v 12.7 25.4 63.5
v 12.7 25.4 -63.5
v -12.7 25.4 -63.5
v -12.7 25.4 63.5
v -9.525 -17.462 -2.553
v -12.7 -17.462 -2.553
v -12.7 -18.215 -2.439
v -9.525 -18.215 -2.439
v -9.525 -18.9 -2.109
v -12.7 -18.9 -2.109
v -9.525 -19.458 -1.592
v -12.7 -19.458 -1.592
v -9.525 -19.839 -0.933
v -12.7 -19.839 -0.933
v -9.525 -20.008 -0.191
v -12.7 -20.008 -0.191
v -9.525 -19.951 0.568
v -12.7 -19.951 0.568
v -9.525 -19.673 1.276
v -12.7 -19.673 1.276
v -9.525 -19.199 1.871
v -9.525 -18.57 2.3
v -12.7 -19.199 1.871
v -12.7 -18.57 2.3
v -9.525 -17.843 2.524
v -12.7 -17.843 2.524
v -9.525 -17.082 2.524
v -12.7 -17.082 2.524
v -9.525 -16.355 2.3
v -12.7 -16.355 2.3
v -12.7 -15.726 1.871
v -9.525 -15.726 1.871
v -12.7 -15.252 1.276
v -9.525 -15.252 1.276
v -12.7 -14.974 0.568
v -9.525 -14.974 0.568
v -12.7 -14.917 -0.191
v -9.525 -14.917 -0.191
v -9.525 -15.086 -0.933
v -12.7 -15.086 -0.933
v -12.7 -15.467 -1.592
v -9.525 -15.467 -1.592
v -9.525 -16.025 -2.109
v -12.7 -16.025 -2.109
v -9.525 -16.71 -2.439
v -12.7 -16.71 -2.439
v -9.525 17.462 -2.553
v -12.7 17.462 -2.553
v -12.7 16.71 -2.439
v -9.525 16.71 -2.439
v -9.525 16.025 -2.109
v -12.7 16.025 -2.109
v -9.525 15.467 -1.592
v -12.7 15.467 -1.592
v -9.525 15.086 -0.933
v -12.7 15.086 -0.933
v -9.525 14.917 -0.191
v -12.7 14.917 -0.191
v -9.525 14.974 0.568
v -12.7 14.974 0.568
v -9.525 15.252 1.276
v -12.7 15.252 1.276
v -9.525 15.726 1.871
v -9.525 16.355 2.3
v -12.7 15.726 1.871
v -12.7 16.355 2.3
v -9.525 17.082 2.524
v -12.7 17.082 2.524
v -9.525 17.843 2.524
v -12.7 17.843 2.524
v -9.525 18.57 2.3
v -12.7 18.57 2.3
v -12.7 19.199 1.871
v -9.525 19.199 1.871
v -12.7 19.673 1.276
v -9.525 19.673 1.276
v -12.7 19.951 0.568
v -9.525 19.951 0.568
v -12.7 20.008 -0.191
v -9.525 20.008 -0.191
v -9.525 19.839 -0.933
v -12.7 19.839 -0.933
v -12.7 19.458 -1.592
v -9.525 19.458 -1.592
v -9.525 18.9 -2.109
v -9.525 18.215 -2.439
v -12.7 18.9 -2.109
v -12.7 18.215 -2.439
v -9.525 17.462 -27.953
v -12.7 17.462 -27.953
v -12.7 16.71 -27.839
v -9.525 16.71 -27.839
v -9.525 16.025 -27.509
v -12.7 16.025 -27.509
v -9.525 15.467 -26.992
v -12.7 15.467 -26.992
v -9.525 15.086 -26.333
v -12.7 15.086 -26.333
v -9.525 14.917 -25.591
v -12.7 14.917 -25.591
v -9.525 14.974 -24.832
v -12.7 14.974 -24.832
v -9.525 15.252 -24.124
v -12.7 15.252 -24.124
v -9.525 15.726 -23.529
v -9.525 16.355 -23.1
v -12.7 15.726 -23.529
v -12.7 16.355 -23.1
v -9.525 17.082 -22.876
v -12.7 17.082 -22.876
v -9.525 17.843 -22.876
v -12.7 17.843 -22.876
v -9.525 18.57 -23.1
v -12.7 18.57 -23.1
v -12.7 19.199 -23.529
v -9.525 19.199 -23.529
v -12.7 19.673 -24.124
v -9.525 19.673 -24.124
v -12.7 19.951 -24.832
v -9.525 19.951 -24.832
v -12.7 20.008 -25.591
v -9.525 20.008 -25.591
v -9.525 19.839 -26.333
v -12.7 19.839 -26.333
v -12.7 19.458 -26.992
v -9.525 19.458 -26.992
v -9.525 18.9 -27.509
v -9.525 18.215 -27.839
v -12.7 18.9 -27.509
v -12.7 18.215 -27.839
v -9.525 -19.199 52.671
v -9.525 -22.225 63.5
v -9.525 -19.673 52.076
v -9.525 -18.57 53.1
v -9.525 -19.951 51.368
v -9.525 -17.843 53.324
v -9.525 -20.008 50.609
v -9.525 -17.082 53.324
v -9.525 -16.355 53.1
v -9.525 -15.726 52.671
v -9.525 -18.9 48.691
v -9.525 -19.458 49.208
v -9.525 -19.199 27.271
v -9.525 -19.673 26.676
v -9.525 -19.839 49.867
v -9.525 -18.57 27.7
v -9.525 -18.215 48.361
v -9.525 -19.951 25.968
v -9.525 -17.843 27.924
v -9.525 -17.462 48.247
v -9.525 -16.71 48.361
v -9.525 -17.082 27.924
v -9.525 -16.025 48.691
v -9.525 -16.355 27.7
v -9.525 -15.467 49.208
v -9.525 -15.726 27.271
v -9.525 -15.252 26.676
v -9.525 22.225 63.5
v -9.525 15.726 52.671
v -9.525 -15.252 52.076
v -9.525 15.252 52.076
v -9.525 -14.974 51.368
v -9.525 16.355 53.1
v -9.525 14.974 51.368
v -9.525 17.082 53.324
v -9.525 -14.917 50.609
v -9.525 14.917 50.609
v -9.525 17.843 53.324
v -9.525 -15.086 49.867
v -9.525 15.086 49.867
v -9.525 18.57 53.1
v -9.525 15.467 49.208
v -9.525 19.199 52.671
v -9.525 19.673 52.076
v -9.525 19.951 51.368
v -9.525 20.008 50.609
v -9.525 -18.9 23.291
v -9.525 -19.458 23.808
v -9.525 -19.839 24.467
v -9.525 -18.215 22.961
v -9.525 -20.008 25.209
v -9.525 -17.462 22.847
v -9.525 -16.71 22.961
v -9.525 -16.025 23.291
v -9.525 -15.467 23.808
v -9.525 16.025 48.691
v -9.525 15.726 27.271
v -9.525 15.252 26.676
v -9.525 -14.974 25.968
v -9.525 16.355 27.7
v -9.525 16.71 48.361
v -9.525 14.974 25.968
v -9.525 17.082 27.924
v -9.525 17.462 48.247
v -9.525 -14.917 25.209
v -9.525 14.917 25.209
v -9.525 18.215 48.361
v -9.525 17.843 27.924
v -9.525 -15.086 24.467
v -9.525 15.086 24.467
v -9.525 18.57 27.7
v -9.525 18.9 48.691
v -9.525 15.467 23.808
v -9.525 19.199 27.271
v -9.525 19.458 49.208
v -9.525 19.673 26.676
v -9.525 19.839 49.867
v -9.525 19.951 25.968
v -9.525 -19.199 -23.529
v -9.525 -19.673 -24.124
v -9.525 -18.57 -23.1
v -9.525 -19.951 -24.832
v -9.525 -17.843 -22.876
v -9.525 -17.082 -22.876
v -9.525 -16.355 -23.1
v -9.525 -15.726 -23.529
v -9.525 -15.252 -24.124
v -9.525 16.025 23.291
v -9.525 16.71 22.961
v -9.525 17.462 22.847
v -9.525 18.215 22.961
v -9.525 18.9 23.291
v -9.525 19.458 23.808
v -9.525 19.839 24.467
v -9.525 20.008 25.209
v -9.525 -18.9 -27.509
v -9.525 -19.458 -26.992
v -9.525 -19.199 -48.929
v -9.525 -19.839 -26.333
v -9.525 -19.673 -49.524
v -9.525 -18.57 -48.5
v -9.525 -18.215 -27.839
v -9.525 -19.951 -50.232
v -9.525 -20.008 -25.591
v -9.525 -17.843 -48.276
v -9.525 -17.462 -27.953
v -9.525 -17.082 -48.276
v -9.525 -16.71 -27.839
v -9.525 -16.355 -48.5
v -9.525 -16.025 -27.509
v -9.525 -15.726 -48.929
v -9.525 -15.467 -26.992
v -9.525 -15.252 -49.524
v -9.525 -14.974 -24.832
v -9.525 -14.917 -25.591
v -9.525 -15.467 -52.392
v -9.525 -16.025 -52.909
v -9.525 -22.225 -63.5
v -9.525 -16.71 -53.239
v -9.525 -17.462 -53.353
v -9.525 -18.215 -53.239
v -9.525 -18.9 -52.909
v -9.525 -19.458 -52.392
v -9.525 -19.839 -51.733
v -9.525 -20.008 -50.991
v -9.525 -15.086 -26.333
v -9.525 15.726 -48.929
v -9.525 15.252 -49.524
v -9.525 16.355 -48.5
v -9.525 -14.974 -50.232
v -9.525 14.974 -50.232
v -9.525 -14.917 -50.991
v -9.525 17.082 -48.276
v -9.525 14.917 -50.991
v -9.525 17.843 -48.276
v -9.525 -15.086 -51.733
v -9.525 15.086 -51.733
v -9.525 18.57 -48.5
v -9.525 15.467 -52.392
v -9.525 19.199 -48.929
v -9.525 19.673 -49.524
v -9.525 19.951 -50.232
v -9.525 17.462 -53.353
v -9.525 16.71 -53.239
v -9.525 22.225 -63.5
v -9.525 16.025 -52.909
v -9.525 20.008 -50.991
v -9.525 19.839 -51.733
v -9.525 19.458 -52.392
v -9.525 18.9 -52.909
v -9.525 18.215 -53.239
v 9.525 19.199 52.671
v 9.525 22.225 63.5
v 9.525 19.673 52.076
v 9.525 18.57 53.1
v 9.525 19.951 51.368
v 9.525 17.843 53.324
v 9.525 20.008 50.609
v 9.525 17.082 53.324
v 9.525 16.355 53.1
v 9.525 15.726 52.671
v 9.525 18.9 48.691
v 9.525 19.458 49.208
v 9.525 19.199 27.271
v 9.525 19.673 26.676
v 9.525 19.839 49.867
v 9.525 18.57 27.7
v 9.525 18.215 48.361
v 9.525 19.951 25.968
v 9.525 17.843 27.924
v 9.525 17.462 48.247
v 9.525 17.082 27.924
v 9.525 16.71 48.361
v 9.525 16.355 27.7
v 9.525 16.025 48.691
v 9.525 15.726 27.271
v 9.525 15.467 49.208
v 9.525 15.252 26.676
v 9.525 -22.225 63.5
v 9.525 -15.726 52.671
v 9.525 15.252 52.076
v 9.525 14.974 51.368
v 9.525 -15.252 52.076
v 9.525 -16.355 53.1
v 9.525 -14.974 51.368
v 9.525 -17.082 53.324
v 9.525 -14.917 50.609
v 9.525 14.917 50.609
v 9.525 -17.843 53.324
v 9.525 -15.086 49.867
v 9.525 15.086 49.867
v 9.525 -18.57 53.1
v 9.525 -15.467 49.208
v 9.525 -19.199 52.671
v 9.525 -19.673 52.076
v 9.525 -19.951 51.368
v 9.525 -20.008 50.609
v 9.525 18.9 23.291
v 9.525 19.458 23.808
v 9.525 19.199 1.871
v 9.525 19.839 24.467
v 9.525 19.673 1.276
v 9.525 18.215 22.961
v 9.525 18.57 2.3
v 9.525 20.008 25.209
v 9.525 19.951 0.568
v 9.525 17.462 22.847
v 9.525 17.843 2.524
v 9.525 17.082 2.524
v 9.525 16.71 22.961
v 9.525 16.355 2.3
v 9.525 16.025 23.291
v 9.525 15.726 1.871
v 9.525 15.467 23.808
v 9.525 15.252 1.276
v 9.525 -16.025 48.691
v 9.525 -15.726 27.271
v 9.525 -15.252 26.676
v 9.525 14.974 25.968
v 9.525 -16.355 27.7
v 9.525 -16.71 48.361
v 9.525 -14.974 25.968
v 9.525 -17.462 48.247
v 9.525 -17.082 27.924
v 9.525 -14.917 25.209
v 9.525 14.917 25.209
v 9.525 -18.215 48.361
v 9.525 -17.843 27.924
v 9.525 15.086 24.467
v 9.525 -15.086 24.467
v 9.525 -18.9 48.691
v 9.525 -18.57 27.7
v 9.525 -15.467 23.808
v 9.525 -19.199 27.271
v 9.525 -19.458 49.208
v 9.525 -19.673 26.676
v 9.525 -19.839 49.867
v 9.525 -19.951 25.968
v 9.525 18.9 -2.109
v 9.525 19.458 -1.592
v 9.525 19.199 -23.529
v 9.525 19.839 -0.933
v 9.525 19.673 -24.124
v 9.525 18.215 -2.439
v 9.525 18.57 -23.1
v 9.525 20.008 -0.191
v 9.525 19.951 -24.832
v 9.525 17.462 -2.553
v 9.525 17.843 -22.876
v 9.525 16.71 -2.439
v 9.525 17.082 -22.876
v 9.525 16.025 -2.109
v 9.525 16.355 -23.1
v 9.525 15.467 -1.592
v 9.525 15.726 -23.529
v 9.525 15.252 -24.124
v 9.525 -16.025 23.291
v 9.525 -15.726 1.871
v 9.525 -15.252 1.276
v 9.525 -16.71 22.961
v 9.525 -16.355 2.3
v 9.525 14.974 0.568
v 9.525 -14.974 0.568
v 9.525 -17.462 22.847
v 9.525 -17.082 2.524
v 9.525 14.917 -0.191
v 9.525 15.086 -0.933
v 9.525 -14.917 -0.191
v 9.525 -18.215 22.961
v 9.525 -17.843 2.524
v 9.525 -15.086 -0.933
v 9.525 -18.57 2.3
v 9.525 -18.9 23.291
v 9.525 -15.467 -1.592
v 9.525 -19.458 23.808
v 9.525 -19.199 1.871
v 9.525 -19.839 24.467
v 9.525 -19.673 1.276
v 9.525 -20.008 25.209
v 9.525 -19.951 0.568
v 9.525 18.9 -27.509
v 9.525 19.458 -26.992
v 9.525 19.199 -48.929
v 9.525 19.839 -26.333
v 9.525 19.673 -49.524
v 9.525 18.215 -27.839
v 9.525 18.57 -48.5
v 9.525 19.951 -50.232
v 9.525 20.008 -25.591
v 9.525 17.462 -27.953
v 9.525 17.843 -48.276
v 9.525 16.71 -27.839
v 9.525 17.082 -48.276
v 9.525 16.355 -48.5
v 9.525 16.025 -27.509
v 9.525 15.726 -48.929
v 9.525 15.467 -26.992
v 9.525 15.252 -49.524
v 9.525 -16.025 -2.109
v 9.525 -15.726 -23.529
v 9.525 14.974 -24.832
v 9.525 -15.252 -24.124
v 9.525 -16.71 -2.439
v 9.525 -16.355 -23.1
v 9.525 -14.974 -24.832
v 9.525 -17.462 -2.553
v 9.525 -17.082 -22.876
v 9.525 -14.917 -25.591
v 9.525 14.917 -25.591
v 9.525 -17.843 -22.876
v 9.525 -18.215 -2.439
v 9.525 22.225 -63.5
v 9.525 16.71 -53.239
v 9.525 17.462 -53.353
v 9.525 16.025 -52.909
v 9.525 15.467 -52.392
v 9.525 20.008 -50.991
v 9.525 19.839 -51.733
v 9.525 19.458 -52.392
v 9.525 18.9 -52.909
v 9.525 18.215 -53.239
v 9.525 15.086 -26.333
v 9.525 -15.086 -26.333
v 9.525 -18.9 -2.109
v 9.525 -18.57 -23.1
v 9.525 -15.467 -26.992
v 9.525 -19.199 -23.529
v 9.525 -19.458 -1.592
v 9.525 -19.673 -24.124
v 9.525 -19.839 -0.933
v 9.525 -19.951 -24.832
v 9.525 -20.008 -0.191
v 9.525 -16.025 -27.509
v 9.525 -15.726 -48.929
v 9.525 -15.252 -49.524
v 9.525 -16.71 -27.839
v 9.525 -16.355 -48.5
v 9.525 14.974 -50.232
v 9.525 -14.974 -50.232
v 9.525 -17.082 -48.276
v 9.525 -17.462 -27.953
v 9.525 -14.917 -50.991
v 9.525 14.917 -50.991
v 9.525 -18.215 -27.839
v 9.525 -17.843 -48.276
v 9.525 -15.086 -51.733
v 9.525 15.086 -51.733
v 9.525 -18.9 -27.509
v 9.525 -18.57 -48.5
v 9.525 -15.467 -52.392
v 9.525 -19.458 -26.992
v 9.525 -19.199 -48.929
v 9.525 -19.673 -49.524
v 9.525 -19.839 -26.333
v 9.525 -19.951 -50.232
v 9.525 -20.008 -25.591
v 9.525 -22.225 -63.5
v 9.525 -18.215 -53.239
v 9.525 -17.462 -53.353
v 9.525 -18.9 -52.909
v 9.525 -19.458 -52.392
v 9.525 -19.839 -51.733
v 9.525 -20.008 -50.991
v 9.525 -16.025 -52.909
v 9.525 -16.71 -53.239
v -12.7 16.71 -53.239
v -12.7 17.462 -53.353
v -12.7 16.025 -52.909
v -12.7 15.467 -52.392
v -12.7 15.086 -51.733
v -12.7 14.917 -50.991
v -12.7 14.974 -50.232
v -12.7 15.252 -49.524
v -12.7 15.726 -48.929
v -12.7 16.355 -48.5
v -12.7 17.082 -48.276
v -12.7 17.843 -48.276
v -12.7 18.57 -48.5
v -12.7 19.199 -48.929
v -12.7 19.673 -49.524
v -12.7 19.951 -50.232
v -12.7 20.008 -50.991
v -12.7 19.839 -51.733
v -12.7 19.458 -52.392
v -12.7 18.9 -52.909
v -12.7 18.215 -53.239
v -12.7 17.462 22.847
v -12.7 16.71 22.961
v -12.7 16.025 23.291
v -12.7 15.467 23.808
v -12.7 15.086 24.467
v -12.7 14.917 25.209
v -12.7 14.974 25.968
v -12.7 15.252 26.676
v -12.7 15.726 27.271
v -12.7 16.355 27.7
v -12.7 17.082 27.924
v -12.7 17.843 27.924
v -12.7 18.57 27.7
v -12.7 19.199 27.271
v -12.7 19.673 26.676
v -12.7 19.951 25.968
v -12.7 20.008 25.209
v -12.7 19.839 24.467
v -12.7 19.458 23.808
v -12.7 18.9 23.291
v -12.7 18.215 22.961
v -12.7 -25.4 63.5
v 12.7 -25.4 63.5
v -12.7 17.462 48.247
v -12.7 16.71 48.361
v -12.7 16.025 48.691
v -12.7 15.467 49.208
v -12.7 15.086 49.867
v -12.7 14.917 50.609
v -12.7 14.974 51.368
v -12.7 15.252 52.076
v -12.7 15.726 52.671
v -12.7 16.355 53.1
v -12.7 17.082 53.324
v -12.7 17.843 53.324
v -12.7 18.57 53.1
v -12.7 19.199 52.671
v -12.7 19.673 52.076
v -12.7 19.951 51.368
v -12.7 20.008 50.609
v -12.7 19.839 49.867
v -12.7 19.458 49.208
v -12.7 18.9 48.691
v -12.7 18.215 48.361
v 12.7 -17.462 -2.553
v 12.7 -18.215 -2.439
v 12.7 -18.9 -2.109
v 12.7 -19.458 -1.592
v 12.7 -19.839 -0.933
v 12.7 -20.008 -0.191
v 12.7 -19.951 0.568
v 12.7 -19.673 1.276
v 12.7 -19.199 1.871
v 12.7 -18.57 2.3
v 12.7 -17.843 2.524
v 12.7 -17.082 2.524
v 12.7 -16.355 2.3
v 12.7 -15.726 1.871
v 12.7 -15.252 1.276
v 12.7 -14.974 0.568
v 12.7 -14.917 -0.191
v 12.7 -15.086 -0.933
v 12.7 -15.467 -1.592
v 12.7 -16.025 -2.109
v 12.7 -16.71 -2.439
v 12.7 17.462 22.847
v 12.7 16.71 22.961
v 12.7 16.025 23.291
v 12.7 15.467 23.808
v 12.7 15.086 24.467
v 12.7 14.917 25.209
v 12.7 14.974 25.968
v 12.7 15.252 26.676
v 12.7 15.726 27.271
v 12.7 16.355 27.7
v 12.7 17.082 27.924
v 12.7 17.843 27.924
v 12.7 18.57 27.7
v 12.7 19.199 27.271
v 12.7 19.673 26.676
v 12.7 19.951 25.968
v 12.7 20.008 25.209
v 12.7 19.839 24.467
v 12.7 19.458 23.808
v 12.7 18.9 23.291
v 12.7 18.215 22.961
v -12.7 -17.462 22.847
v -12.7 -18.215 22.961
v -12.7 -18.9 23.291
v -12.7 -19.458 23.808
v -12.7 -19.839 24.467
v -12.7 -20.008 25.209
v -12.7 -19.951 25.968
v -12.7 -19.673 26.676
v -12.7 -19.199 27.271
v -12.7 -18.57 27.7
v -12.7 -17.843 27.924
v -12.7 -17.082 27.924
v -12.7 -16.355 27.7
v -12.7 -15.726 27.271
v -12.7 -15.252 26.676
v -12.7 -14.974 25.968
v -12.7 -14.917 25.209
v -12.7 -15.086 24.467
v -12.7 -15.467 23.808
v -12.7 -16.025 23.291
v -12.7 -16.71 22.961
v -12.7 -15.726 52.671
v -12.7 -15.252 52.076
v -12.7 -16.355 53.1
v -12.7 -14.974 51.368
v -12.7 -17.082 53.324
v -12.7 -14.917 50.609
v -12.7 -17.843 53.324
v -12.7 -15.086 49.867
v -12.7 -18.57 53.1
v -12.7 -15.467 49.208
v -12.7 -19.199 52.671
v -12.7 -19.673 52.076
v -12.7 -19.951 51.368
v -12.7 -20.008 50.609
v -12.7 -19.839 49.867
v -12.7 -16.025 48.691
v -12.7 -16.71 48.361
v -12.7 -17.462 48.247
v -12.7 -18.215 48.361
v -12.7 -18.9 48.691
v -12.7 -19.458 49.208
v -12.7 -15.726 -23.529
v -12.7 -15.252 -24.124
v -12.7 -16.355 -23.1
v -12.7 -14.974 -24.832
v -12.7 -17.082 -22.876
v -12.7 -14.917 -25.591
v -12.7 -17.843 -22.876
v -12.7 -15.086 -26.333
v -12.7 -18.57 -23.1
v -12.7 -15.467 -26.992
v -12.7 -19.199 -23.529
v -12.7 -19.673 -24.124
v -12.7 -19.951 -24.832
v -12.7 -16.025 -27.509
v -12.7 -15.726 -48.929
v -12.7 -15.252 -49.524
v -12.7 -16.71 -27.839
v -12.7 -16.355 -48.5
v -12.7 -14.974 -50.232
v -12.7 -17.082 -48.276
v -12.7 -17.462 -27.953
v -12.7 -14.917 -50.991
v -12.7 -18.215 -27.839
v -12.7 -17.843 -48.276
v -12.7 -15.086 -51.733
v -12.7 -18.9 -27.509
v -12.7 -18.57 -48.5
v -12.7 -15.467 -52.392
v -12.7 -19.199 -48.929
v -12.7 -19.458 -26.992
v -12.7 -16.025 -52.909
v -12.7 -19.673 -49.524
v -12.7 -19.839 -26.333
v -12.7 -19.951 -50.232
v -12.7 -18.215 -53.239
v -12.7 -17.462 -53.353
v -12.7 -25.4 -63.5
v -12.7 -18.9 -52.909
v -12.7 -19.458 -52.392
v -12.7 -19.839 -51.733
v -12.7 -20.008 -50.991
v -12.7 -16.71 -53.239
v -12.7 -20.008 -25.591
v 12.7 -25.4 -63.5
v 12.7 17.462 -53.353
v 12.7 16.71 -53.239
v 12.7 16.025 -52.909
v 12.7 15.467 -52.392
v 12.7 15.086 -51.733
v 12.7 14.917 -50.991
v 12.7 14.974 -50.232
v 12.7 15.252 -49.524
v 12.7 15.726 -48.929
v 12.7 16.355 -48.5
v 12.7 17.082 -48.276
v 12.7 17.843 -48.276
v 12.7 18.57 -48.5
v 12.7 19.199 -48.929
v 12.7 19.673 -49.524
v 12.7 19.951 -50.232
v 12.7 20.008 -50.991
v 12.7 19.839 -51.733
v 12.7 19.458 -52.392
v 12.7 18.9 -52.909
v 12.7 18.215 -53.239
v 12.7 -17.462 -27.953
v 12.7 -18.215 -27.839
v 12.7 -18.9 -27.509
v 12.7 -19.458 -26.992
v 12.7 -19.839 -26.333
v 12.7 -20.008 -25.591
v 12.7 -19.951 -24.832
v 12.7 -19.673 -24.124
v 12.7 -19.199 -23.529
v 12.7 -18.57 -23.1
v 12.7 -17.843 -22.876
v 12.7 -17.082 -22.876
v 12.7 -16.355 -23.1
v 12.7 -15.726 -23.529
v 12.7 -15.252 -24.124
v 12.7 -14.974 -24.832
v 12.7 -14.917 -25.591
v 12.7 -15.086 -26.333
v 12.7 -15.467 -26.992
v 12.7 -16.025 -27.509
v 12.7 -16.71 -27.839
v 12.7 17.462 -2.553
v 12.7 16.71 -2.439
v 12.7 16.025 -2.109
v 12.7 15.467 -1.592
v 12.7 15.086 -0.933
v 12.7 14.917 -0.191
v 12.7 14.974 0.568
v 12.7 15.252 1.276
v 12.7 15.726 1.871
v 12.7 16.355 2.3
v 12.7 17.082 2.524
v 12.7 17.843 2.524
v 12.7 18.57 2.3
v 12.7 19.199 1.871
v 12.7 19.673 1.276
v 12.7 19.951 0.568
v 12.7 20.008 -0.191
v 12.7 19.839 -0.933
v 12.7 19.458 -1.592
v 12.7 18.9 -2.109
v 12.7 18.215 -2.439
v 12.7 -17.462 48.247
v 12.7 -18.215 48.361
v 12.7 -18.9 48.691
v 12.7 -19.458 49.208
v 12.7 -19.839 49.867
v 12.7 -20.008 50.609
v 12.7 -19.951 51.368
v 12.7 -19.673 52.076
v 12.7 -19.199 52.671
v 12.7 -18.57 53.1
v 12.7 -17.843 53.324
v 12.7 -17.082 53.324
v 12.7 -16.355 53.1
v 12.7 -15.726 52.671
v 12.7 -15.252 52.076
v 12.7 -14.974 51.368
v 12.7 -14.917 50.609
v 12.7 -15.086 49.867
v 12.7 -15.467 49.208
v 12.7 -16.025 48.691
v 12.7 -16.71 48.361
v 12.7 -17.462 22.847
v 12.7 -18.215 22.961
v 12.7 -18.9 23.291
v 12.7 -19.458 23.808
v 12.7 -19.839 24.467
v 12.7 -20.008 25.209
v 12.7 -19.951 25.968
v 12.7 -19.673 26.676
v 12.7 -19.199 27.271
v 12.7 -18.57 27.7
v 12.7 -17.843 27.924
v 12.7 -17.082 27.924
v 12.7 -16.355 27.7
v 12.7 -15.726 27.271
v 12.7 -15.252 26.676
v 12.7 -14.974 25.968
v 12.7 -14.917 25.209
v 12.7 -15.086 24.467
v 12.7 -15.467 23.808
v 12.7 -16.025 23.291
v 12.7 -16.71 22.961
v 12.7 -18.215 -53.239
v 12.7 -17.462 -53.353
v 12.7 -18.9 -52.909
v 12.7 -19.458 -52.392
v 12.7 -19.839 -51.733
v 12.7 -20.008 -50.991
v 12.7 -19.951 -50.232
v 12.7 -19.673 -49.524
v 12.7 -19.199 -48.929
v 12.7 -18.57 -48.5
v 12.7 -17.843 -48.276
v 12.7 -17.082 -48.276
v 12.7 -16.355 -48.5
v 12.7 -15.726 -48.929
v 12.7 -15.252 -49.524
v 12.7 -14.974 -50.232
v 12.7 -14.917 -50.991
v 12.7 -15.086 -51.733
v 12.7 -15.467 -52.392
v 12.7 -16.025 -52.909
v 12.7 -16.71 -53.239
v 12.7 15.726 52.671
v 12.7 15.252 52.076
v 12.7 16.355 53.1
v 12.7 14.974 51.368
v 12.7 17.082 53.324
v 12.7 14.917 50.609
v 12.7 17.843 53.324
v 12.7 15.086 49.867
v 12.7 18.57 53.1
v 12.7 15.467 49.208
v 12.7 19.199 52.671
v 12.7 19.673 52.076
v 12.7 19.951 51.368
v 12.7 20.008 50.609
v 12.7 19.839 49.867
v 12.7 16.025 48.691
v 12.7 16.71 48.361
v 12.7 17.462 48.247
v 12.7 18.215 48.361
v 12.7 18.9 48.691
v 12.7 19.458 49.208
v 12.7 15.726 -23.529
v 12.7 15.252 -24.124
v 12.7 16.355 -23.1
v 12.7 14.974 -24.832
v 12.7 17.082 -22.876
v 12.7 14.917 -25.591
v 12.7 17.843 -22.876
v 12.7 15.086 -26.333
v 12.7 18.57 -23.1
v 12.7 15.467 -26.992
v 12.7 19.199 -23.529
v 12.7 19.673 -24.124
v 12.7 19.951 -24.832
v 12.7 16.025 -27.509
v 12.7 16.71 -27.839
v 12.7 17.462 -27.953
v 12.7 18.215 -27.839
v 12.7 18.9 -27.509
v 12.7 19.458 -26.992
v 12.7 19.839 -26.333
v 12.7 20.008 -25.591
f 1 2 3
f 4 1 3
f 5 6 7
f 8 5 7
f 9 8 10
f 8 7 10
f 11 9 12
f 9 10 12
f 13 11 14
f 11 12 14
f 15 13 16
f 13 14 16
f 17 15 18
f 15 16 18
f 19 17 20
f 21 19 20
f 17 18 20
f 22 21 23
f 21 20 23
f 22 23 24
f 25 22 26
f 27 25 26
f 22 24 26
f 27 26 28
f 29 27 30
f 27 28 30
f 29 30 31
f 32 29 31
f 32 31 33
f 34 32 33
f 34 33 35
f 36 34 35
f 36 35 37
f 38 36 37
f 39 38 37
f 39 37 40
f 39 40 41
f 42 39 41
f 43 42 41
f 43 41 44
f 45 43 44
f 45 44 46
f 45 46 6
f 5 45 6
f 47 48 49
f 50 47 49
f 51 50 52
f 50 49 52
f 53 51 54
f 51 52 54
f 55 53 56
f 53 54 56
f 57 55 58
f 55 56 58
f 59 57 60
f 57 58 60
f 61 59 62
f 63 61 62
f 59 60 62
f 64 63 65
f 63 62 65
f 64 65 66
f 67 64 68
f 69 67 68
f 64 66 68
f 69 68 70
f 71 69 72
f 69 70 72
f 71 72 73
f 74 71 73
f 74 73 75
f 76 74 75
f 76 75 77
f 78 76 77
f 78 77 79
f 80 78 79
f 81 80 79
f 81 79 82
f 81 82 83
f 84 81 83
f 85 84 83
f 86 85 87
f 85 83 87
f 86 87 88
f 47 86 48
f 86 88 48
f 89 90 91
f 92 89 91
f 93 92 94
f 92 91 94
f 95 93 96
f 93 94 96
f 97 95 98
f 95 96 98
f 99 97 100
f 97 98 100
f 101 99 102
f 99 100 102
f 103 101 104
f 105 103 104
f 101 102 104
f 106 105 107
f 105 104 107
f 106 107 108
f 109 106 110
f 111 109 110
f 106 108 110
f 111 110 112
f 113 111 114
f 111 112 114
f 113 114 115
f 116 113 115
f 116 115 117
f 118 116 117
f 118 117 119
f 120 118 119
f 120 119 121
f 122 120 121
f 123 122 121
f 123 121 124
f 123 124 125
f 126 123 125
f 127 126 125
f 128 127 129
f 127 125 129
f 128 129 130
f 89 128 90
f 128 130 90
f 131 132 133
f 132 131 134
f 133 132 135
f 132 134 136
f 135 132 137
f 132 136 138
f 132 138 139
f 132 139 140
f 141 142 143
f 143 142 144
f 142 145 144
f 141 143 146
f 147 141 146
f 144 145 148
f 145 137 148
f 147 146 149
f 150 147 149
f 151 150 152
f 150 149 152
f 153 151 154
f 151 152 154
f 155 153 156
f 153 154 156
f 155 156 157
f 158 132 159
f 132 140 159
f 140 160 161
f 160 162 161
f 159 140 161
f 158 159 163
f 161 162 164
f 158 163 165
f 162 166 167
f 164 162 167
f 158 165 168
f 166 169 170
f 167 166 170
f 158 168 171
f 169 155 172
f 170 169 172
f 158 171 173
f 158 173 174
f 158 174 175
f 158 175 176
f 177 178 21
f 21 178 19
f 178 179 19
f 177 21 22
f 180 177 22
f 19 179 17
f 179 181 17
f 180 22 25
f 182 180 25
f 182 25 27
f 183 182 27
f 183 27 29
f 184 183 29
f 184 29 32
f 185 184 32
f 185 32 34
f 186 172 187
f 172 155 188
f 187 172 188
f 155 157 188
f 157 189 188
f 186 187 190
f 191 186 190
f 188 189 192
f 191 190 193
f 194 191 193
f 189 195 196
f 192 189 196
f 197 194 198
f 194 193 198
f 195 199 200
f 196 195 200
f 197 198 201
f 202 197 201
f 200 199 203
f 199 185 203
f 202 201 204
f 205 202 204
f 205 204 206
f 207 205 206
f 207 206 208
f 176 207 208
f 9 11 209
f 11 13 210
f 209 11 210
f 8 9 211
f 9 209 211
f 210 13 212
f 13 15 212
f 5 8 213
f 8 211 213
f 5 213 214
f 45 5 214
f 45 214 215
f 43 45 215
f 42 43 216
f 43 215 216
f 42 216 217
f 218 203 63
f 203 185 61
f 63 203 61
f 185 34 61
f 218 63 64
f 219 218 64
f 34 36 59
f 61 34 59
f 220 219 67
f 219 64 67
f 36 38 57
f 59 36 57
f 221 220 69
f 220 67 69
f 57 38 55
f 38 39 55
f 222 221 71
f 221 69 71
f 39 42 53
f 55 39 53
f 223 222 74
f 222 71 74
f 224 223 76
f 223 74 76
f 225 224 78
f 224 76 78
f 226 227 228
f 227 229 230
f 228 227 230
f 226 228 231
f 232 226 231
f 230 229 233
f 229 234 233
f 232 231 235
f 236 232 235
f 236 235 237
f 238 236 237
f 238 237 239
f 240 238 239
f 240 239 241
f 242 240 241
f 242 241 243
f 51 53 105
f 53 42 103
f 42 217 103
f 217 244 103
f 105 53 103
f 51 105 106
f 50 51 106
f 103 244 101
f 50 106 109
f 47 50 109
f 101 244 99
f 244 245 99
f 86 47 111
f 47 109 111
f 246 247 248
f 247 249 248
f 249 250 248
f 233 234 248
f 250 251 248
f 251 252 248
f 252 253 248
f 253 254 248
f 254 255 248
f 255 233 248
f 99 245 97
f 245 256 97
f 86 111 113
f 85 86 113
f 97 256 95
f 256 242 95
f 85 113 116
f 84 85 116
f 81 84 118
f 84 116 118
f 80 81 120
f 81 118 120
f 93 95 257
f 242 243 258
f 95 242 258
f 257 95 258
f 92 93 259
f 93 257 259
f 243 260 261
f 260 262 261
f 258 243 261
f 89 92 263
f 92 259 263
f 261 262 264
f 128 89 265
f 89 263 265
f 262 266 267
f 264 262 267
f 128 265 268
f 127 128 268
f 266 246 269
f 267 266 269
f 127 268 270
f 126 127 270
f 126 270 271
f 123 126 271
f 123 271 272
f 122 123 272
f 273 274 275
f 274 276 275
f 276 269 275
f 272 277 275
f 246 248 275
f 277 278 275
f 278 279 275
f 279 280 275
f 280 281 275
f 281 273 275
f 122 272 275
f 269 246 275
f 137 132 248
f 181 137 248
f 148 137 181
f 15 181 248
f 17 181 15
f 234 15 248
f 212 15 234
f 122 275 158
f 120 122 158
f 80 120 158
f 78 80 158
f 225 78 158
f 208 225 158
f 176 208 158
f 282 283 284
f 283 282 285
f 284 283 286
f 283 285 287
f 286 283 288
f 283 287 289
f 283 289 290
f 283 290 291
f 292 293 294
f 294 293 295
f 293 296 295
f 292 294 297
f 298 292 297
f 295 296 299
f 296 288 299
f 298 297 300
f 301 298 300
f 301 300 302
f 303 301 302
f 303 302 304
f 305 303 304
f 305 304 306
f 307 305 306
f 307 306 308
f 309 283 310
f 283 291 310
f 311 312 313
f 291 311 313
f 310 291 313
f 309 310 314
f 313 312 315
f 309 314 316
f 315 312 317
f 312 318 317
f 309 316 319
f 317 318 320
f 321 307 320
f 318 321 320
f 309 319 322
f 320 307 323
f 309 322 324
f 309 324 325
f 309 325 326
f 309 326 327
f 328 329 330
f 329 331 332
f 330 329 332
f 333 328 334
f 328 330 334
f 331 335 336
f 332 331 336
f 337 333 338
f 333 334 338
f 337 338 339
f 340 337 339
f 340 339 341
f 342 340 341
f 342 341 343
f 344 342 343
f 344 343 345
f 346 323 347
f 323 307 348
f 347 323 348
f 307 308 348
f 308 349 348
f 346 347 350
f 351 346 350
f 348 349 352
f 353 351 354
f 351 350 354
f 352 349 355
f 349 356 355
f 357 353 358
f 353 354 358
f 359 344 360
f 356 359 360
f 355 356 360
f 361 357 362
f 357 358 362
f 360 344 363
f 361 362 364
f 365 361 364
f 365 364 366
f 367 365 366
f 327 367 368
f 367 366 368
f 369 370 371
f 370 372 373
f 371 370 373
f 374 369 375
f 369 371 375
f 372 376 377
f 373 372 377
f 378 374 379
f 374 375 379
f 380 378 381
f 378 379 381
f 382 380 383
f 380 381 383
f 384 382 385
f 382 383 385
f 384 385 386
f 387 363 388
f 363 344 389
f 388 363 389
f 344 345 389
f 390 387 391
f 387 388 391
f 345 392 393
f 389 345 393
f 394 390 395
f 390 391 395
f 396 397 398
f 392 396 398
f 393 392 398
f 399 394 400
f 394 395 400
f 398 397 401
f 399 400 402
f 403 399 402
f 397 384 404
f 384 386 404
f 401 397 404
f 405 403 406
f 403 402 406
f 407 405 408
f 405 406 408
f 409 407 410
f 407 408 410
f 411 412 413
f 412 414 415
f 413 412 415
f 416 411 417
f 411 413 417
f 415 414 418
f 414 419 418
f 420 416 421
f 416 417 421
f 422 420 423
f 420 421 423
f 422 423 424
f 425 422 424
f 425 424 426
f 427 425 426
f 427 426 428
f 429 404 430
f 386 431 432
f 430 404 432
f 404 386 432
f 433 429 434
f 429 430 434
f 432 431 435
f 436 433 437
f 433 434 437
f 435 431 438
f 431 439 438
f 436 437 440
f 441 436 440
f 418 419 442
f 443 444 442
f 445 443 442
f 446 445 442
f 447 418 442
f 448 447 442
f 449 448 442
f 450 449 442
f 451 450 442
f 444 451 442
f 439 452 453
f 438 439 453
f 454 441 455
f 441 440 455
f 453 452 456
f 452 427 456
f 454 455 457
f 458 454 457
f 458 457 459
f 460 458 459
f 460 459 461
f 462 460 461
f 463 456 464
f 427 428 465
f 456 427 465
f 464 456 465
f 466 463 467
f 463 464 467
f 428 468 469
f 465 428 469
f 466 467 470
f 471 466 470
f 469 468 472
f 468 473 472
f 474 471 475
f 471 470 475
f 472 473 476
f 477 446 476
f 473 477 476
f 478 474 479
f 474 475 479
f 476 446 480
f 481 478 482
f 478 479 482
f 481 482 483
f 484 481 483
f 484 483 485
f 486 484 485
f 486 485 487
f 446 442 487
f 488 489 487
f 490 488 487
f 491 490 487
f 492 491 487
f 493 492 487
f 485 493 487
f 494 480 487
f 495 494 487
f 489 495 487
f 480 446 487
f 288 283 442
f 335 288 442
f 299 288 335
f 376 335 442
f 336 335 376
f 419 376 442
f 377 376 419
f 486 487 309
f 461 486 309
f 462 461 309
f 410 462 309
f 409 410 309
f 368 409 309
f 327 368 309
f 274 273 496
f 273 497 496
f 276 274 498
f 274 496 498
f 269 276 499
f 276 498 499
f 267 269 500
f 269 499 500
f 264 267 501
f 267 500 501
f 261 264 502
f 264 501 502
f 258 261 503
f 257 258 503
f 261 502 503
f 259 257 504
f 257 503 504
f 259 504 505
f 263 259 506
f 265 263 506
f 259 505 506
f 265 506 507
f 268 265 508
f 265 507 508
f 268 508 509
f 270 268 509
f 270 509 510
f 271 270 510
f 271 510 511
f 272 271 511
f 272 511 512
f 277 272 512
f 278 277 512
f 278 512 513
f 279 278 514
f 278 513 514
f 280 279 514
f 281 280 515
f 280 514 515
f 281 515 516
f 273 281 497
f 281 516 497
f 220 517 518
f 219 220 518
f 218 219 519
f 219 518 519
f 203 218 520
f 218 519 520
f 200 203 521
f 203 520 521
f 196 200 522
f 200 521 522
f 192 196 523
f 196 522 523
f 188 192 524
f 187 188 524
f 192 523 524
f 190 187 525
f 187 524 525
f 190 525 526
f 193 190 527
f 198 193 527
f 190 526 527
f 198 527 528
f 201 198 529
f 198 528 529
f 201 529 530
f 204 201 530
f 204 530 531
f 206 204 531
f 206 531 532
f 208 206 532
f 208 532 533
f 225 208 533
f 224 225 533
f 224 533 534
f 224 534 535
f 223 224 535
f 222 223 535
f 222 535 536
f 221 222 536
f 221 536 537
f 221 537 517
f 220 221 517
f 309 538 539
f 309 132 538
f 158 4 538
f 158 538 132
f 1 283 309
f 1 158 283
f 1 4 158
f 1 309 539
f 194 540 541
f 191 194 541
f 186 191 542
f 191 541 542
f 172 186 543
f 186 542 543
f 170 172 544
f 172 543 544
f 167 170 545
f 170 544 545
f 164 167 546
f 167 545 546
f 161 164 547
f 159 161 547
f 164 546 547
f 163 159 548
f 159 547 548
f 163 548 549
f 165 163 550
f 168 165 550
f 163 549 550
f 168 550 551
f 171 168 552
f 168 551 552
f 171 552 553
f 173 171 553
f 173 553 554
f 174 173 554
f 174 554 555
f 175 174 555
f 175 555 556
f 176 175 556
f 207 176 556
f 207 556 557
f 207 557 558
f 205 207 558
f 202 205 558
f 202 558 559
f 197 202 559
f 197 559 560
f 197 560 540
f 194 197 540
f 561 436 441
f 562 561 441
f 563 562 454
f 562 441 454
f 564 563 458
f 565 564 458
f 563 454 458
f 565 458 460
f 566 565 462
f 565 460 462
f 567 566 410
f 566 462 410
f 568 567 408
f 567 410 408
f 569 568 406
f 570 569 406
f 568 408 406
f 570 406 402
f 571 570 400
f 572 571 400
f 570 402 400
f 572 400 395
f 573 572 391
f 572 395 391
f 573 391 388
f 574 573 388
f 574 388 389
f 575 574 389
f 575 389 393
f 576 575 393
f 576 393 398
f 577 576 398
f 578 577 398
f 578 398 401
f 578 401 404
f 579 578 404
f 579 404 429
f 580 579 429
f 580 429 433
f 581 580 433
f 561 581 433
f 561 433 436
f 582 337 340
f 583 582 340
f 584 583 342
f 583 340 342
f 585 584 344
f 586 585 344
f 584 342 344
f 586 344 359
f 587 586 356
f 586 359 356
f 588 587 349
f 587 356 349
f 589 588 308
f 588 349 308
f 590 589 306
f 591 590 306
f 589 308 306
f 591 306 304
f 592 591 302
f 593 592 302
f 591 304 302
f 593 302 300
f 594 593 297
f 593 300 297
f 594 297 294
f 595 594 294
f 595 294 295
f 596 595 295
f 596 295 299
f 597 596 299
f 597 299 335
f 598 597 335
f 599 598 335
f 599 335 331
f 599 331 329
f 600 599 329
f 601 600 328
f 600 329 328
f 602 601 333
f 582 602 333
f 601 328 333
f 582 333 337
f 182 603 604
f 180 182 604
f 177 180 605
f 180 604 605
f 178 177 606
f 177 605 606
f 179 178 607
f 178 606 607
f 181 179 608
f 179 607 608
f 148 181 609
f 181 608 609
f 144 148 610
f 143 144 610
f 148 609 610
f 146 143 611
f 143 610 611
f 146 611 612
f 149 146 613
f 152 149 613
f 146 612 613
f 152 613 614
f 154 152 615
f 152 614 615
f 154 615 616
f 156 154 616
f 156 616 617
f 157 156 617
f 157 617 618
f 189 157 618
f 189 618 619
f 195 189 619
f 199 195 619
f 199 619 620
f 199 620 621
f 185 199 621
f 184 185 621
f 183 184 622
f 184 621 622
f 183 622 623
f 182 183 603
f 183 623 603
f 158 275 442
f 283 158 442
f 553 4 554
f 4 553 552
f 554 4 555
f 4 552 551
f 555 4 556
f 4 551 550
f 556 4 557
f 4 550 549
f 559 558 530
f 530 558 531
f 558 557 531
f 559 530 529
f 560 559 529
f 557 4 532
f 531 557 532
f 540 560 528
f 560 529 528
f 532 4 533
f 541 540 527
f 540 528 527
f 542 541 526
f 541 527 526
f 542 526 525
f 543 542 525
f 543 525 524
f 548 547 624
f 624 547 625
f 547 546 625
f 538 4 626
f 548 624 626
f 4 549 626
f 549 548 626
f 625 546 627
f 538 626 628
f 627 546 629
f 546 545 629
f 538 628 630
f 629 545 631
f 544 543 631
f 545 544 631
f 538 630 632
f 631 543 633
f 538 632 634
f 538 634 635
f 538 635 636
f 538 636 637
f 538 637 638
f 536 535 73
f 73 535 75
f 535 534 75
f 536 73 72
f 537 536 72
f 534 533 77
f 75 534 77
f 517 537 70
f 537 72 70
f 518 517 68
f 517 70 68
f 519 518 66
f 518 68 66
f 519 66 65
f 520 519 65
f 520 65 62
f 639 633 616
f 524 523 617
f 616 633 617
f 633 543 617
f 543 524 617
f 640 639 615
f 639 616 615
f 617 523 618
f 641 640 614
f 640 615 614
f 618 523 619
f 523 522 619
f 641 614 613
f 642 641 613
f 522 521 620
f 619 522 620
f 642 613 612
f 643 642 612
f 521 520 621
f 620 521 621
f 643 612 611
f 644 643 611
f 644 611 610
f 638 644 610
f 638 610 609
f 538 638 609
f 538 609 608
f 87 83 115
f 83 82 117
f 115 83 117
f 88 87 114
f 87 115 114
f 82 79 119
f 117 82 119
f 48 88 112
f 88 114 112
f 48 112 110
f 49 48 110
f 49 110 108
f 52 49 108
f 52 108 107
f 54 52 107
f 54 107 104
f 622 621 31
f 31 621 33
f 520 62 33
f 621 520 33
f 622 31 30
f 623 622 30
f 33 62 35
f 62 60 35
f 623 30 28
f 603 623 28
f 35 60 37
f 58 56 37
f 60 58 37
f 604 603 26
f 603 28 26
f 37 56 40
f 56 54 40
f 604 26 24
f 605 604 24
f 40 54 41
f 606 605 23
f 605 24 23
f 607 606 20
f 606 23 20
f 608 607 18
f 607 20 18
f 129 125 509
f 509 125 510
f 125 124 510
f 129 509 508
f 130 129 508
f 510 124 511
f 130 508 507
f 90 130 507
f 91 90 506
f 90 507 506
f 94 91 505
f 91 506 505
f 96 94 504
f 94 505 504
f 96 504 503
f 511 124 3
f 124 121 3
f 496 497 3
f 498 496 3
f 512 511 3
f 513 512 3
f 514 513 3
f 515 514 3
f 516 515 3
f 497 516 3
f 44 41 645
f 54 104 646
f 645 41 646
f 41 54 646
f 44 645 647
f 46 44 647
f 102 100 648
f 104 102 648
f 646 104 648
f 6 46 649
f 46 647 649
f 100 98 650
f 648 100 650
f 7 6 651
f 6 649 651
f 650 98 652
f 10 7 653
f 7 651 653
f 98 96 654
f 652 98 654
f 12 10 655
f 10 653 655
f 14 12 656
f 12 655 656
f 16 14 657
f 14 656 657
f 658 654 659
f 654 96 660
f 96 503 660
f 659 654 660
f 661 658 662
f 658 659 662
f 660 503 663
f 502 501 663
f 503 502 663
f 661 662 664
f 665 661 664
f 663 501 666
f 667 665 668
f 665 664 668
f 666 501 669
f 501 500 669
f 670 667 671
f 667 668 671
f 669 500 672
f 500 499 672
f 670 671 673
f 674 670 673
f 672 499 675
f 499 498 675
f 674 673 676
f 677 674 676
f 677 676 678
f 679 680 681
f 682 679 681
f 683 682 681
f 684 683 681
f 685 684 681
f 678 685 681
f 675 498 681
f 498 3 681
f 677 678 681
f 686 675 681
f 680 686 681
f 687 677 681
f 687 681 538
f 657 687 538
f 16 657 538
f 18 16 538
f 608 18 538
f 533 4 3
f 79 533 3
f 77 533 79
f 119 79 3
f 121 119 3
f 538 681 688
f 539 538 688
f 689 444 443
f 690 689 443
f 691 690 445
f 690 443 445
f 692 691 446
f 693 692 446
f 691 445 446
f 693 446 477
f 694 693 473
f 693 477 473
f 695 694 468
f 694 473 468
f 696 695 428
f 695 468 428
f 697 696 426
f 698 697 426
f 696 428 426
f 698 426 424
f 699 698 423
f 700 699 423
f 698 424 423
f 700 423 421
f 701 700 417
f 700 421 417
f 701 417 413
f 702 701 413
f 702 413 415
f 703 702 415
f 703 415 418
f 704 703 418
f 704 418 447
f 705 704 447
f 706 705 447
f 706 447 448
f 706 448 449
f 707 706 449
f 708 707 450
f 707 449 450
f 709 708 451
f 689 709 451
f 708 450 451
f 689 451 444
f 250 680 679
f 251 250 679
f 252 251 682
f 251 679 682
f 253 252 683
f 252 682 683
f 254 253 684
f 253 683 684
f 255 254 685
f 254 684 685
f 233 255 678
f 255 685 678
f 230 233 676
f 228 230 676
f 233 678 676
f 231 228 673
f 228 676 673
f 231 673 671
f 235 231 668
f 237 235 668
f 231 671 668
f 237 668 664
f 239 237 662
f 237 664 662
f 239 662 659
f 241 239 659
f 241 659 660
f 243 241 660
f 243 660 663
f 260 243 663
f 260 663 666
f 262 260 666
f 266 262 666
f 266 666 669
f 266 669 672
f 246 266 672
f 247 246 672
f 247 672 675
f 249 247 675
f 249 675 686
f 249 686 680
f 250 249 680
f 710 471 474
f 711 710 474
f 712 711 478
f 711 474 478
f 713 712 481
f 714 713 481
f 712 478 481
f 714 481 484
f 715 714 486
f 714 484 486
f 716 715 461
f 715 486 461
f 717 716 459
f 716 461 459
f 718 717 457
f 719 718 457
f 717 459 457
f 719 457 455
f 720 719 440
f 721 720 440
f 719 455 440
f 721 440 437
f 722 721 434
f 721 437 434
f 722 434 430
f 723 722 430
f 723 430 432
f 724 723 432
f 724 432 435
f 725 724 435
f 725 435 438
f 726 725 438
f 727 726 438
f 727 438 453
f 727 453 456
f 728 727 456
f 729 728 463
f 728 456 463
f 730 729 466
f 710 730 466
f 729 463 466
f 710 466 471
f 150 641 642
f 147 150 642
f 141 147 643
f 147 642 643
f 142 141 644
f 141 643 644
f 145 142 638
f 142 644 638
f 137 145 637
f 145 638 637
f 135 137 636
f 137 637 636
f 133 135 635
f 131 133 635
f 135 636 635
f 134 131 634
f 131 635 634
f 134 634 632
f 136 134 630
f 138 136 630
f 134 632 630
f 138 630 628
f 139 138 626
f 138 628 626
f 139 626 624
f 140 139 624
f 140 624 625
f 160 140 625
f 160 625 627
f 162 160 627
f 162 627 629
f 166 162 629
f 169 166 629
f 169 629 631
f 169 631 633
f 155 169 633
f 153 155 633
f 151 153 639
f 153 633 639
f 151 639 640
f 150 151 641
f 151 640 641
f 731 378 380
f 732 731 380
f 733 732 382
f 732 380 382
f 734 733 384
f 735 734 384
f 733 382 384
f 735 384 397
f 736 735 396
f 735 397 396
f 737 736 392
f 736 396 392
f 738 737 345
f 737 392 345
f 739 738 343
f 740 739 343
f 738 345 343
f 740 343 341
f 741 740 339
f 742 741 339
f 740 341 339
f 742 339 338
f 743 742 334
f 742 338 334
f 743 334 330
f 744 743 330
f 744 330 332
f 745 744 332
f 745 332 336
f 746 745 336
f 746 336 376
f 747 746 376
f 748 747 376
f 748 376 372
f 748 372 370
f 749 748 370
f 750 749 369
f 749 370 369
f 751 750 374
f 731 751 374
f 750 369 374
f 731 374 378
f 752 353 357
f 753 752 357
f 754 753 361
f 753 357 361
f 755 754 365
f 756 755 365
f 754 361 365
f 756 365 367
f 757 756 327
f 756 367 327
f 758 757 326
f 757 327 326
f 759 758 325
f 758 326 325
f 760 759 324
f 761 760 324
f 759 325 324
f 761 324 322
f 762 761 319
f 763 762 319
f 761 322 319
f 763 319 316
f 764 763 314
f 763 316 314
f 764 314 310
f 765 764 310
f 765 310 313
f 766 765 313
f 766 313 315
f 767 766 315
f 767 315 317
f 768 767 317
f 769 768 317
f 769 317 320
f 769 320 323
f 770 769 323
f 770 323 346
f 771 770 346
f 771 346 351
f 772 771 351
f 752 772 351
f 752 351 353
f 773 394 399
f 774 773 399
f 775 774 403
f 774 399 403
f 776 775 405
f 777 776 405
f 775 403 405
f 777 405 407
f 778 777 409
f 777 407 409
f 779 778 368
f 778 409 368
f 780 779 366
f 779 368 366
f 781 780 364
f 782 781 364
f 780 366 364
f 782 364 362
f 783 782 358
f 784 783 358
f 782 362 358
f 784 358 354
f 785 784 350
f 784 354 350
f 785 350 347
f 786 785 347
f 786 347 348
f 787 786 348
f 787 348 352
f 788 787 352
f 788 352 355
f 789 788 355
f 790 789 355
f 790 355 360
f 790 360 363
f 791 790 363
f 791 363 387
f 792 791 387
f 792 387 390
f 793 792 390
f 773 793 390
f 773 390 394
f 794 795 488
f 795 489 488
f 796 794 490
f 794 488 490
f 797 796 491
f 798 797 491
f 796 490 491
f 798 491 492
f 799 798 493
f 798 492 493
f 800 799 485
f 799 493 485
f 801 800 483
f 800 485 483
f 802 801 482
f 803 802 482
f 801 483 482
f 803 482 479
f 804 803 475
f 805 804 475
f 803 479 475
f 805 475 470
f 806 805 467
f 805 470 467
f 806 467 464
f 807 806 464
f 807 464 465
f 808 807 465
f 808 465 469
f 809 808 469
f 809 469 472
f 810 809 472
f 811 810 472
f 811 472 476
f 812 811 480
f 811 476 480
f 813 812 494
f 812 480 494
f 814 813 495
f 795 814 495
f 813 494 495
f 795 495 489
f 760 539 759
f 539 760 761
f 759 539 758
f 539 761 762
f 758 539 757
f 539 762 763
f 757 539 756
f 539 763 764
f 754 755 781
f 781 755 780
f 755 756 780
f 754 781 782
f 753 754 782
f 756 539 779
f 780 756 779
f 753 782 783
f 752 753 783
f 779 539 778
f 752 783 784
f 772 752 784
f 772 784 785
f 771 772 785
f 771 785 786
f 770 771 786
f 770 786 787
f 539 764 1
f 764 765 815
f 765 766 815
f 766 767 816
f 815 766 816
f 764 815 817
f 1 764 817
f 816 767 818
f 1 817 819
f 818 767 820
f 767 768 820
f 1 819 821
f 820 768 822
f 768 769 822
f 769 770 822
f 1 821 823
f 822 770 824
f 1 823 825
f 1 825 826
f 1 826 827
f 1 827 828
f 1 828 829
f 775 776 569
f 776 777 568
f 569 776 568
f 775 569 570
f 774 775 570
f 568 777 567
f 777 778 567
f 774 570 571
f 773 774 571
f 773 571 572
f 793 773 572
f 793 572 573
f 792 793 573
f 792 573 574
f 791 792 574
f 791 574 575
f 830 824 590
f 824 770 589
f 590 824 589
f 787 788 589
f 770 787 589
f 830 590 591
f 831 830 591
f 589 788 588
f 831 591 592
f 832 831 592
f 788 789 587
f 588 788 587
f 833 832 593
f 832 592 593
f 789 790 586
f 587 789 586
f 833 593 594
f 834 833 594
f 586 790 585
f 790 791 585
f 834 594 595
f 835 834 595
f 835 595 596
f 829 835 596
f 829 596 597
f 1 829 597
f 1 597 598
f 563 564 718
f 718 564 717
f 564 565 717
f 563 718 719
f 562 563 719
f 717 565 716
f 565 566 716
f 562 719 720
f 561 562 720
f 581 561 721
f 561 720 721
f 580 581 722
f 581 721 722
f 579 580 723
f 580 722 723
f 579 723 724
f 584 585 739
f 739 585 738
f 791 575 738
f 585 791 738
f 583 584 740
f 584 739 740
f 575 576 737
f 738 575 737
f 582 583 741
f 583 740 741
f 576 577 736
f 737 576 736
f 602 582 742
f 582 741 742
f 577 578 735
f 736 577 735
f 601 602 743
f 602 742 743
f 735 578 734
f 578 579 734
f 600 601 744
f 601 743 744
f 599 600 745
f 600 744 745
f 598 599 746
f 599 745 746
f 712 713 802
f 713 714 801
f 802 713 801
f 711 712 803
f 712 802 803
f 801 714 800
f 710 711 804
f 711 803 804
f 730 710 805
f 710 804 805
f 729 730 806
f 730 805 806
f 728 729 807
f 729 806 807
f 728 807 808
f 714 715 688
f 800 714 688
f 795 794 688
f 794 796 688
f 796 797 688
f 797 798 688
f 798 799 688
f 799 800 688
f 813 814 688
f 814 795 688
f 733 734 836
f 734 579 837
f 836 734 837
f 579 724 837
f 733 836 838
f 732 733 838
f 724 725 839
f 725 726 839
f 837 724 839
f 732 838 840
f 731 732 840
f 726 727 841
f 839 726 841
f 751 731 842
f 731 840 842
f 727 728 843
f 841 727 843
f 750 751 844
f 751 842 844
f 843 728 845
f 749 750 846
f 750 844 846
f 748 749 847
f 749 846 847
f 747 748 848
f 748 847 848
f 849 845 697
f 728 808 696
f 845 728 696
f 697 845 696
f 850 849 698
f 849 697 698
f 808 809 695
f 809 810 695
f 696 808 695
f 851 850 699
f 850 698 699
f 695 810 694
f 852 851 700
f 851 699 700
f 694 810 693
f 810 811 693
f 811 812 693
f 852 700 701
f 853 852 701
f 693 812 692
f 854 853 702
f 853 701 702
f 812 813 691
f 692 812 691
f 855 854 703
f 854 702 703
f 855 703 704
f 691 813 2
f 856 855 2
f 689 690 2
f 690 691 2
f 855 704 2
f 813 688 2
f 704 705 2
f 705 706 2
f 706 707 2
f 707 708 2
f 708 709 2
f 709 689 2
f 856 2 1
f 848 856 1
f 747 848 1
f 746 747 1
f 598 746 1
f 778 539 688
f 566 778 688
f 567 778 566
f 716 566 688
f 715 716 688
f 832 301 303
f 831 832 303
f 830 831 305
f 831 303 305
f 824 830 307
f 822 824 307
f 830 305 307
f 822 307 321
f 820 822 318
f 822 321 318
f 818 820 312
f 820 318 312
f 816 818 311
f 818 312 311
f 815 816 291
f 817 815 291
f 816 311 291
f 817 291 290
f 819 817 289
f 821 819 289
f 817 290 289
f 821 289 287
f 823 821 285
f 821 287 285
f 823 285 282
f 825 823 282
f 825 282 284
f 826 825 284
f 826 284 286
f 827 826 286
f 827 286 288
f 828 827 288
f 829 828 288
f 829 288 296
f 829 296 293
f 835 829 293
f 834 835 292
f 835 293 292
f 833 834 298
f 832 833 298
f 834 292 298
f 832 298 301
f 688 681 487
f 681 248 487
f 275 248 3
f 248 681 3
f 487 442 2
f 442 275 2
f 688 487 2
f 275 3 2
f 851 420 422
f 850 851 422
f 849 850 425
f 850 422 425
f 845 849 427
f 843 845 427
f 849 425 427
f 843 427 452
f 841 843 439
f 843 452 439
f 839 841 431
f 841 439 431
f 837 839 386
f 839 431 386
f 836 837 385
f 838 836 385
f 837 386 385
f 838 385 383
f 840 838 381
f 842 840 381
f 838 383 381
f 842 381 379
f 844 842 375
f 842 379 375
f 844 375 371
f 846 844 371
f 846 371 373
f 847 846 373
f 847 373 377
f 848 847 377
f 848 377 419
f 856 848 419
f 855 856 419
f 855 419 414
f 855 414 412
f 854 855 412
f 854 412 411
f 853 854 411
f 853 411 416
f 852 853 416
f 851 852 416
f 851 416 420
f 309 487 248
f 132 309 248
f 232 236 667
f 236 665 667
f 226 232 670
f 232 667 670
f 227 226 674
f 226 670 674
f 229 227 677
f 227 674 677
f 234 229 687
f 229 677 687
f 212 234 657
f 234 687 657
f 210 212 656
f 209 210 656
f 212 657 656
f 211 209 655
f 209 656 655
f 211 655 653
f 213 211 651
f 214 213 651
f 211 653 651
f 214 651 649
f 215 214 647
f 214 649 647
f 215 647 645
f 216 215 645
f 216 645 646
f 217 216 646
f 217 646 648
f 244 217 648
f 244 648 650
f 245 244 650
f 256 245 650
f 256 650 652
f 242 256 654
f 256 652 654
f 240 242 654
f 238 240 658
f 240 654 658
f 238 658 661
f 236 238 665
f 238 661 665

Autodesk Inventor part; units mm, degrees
ref_plane "YZ Plane" through (0, 0, 0) normal (1, 0, 0) x (0, 1, 0)
ref_plane "XZ Plane" through (0, 0, 0) normal (0, 1, 0) x (-1, 0, 0)
ref_plane "XY Plane" through (0, 0, 0) normal (0, 0, 1) x (1, 0, 0)
sketch "Sketch1" plane through (0, 0, 0) normal (0, 0, 1) x (1, 0, 0)
  line L0 (-12.7, -25.4) -> (12.7, -25.4)
  line L1 (12.7, -25.4) -> (12.7, 25.4)
  line L2 (12.7, 25.4) -> (-12.7, 25.4)
  line L3 (-12.7, 25.4) -> (-12.7, -25.4)
  line L4 (-12.7, -25.4) -> (12.7, 25.4) construction
  line L5 (12.7, -25.4) -> (-12.7, 25.4) construction
  line L6 (-9.525, 22.225) -> (9.525, 22.225)
  line L7 (9.525, 22.225) -> (9.525, -22.225)
  line L8 (9.525, -22.225) -> (-9.525, -22.225)
  line L9 (-9.525, -22.225) -> (-9.525, 22.225)
  point P0 (0, 0)
  dimension "width" = 25.4
  dimension "height" = 50.8
  dimension "thickness" = 3.175
extrude "Extrusion1" add sketch "Sketch1" along normal mid plane 127
sketch "Sketch2" plane through (12.7, -25.4, 63.5) normal (1, 0, 0) x (0, 0, -1)
  line L0 (127, 50.8) -> (0, 50.8) construction
  line L1 (0, 0) -> (0, 50.8) construction
  line L2 (127, 0) -> (0, 0) construction
  line L3 (127, 50.8) -> (127, 0) construction
  circle A0 centre (114.3, 42.8625) radius 4.7625 construction
  line L4 (0, 47.625) -> (127, 47.625) construction
  circle A1 centre (114.3, 7.9375) radius 4.7625 construction
  line L5 (0, 3.175) -> (127, 3.175) construction
  point P0 (63.5, 25.4)
  point P1 (88.9, 42.8625)
  point P2 (88.9, 7.9375)
  point P3 (63.5, 42.8625)
  point P4 (63.5, 7.9375)
  point P5 (38.1, 42.8625)
  point P6 (38.1, 7.9375)
  point P7 (12.7, 42.8625)
  point P8 (12.7, 7.9375)
  point P9 (-12.7, 42.8625)
  point P10 (-12.7, 7.9375)
  point P11 (-38.1, 42.8625)
  point P12 (-38.1, 7.9375)
  point P13 (-63.5, 42.8625)
  point P14 (-63.5, 7.9375)
  point P15 (-88.9, 42.8625)
  point P16 (-88.9, 7.9375)
  point P17 (-114.3, 42.8625)
  point P18 (-114.3, 7.9375)
  dimension "d5" = 9.525
  dimension "d6" = 9.525
  dimension "d7" = 12.7
  dimension "d10" = 25.4
hole "Hole1" at (12.7, 17.4625, -50.8) at (12.7, -17.4625, -50.8) at (12.7, 17.4625, -25.4) at (12.7, -17.4625, -25.4) at (12.7, 17.4625, 0) at (12.7, -17.4625, 0) at (12.7, 17.4625, 25.4) at (12.7, -17.4625, 25.4) at (12.7, 17.4625, 50.8) at (12.7, -17.4625, 50.8) at (12.7, 17.4625, 76.2) at (12.7, -17.4625, 76.2) at (12.7, 17.4625, 101.6) at (12.7, -17.4625, 101.6) at (12.7, 17.4625, 127) at (12.7, -17.4625, 127) at (12.7, 17.4625, 152.4) at (12.7, -17.4625, 152.4) at (12.7, 17.4625, 177.8) at (12.7, -17.4625, 177.8) direction (-1, 0, 0) diameter 5.1054 end through all clearance for "Flat Head Machine Screw (82)" size "#10" standard "Ansi Unified Screw Threads"
properties part number "EL2-S-001" material "Aluminum 6061"
